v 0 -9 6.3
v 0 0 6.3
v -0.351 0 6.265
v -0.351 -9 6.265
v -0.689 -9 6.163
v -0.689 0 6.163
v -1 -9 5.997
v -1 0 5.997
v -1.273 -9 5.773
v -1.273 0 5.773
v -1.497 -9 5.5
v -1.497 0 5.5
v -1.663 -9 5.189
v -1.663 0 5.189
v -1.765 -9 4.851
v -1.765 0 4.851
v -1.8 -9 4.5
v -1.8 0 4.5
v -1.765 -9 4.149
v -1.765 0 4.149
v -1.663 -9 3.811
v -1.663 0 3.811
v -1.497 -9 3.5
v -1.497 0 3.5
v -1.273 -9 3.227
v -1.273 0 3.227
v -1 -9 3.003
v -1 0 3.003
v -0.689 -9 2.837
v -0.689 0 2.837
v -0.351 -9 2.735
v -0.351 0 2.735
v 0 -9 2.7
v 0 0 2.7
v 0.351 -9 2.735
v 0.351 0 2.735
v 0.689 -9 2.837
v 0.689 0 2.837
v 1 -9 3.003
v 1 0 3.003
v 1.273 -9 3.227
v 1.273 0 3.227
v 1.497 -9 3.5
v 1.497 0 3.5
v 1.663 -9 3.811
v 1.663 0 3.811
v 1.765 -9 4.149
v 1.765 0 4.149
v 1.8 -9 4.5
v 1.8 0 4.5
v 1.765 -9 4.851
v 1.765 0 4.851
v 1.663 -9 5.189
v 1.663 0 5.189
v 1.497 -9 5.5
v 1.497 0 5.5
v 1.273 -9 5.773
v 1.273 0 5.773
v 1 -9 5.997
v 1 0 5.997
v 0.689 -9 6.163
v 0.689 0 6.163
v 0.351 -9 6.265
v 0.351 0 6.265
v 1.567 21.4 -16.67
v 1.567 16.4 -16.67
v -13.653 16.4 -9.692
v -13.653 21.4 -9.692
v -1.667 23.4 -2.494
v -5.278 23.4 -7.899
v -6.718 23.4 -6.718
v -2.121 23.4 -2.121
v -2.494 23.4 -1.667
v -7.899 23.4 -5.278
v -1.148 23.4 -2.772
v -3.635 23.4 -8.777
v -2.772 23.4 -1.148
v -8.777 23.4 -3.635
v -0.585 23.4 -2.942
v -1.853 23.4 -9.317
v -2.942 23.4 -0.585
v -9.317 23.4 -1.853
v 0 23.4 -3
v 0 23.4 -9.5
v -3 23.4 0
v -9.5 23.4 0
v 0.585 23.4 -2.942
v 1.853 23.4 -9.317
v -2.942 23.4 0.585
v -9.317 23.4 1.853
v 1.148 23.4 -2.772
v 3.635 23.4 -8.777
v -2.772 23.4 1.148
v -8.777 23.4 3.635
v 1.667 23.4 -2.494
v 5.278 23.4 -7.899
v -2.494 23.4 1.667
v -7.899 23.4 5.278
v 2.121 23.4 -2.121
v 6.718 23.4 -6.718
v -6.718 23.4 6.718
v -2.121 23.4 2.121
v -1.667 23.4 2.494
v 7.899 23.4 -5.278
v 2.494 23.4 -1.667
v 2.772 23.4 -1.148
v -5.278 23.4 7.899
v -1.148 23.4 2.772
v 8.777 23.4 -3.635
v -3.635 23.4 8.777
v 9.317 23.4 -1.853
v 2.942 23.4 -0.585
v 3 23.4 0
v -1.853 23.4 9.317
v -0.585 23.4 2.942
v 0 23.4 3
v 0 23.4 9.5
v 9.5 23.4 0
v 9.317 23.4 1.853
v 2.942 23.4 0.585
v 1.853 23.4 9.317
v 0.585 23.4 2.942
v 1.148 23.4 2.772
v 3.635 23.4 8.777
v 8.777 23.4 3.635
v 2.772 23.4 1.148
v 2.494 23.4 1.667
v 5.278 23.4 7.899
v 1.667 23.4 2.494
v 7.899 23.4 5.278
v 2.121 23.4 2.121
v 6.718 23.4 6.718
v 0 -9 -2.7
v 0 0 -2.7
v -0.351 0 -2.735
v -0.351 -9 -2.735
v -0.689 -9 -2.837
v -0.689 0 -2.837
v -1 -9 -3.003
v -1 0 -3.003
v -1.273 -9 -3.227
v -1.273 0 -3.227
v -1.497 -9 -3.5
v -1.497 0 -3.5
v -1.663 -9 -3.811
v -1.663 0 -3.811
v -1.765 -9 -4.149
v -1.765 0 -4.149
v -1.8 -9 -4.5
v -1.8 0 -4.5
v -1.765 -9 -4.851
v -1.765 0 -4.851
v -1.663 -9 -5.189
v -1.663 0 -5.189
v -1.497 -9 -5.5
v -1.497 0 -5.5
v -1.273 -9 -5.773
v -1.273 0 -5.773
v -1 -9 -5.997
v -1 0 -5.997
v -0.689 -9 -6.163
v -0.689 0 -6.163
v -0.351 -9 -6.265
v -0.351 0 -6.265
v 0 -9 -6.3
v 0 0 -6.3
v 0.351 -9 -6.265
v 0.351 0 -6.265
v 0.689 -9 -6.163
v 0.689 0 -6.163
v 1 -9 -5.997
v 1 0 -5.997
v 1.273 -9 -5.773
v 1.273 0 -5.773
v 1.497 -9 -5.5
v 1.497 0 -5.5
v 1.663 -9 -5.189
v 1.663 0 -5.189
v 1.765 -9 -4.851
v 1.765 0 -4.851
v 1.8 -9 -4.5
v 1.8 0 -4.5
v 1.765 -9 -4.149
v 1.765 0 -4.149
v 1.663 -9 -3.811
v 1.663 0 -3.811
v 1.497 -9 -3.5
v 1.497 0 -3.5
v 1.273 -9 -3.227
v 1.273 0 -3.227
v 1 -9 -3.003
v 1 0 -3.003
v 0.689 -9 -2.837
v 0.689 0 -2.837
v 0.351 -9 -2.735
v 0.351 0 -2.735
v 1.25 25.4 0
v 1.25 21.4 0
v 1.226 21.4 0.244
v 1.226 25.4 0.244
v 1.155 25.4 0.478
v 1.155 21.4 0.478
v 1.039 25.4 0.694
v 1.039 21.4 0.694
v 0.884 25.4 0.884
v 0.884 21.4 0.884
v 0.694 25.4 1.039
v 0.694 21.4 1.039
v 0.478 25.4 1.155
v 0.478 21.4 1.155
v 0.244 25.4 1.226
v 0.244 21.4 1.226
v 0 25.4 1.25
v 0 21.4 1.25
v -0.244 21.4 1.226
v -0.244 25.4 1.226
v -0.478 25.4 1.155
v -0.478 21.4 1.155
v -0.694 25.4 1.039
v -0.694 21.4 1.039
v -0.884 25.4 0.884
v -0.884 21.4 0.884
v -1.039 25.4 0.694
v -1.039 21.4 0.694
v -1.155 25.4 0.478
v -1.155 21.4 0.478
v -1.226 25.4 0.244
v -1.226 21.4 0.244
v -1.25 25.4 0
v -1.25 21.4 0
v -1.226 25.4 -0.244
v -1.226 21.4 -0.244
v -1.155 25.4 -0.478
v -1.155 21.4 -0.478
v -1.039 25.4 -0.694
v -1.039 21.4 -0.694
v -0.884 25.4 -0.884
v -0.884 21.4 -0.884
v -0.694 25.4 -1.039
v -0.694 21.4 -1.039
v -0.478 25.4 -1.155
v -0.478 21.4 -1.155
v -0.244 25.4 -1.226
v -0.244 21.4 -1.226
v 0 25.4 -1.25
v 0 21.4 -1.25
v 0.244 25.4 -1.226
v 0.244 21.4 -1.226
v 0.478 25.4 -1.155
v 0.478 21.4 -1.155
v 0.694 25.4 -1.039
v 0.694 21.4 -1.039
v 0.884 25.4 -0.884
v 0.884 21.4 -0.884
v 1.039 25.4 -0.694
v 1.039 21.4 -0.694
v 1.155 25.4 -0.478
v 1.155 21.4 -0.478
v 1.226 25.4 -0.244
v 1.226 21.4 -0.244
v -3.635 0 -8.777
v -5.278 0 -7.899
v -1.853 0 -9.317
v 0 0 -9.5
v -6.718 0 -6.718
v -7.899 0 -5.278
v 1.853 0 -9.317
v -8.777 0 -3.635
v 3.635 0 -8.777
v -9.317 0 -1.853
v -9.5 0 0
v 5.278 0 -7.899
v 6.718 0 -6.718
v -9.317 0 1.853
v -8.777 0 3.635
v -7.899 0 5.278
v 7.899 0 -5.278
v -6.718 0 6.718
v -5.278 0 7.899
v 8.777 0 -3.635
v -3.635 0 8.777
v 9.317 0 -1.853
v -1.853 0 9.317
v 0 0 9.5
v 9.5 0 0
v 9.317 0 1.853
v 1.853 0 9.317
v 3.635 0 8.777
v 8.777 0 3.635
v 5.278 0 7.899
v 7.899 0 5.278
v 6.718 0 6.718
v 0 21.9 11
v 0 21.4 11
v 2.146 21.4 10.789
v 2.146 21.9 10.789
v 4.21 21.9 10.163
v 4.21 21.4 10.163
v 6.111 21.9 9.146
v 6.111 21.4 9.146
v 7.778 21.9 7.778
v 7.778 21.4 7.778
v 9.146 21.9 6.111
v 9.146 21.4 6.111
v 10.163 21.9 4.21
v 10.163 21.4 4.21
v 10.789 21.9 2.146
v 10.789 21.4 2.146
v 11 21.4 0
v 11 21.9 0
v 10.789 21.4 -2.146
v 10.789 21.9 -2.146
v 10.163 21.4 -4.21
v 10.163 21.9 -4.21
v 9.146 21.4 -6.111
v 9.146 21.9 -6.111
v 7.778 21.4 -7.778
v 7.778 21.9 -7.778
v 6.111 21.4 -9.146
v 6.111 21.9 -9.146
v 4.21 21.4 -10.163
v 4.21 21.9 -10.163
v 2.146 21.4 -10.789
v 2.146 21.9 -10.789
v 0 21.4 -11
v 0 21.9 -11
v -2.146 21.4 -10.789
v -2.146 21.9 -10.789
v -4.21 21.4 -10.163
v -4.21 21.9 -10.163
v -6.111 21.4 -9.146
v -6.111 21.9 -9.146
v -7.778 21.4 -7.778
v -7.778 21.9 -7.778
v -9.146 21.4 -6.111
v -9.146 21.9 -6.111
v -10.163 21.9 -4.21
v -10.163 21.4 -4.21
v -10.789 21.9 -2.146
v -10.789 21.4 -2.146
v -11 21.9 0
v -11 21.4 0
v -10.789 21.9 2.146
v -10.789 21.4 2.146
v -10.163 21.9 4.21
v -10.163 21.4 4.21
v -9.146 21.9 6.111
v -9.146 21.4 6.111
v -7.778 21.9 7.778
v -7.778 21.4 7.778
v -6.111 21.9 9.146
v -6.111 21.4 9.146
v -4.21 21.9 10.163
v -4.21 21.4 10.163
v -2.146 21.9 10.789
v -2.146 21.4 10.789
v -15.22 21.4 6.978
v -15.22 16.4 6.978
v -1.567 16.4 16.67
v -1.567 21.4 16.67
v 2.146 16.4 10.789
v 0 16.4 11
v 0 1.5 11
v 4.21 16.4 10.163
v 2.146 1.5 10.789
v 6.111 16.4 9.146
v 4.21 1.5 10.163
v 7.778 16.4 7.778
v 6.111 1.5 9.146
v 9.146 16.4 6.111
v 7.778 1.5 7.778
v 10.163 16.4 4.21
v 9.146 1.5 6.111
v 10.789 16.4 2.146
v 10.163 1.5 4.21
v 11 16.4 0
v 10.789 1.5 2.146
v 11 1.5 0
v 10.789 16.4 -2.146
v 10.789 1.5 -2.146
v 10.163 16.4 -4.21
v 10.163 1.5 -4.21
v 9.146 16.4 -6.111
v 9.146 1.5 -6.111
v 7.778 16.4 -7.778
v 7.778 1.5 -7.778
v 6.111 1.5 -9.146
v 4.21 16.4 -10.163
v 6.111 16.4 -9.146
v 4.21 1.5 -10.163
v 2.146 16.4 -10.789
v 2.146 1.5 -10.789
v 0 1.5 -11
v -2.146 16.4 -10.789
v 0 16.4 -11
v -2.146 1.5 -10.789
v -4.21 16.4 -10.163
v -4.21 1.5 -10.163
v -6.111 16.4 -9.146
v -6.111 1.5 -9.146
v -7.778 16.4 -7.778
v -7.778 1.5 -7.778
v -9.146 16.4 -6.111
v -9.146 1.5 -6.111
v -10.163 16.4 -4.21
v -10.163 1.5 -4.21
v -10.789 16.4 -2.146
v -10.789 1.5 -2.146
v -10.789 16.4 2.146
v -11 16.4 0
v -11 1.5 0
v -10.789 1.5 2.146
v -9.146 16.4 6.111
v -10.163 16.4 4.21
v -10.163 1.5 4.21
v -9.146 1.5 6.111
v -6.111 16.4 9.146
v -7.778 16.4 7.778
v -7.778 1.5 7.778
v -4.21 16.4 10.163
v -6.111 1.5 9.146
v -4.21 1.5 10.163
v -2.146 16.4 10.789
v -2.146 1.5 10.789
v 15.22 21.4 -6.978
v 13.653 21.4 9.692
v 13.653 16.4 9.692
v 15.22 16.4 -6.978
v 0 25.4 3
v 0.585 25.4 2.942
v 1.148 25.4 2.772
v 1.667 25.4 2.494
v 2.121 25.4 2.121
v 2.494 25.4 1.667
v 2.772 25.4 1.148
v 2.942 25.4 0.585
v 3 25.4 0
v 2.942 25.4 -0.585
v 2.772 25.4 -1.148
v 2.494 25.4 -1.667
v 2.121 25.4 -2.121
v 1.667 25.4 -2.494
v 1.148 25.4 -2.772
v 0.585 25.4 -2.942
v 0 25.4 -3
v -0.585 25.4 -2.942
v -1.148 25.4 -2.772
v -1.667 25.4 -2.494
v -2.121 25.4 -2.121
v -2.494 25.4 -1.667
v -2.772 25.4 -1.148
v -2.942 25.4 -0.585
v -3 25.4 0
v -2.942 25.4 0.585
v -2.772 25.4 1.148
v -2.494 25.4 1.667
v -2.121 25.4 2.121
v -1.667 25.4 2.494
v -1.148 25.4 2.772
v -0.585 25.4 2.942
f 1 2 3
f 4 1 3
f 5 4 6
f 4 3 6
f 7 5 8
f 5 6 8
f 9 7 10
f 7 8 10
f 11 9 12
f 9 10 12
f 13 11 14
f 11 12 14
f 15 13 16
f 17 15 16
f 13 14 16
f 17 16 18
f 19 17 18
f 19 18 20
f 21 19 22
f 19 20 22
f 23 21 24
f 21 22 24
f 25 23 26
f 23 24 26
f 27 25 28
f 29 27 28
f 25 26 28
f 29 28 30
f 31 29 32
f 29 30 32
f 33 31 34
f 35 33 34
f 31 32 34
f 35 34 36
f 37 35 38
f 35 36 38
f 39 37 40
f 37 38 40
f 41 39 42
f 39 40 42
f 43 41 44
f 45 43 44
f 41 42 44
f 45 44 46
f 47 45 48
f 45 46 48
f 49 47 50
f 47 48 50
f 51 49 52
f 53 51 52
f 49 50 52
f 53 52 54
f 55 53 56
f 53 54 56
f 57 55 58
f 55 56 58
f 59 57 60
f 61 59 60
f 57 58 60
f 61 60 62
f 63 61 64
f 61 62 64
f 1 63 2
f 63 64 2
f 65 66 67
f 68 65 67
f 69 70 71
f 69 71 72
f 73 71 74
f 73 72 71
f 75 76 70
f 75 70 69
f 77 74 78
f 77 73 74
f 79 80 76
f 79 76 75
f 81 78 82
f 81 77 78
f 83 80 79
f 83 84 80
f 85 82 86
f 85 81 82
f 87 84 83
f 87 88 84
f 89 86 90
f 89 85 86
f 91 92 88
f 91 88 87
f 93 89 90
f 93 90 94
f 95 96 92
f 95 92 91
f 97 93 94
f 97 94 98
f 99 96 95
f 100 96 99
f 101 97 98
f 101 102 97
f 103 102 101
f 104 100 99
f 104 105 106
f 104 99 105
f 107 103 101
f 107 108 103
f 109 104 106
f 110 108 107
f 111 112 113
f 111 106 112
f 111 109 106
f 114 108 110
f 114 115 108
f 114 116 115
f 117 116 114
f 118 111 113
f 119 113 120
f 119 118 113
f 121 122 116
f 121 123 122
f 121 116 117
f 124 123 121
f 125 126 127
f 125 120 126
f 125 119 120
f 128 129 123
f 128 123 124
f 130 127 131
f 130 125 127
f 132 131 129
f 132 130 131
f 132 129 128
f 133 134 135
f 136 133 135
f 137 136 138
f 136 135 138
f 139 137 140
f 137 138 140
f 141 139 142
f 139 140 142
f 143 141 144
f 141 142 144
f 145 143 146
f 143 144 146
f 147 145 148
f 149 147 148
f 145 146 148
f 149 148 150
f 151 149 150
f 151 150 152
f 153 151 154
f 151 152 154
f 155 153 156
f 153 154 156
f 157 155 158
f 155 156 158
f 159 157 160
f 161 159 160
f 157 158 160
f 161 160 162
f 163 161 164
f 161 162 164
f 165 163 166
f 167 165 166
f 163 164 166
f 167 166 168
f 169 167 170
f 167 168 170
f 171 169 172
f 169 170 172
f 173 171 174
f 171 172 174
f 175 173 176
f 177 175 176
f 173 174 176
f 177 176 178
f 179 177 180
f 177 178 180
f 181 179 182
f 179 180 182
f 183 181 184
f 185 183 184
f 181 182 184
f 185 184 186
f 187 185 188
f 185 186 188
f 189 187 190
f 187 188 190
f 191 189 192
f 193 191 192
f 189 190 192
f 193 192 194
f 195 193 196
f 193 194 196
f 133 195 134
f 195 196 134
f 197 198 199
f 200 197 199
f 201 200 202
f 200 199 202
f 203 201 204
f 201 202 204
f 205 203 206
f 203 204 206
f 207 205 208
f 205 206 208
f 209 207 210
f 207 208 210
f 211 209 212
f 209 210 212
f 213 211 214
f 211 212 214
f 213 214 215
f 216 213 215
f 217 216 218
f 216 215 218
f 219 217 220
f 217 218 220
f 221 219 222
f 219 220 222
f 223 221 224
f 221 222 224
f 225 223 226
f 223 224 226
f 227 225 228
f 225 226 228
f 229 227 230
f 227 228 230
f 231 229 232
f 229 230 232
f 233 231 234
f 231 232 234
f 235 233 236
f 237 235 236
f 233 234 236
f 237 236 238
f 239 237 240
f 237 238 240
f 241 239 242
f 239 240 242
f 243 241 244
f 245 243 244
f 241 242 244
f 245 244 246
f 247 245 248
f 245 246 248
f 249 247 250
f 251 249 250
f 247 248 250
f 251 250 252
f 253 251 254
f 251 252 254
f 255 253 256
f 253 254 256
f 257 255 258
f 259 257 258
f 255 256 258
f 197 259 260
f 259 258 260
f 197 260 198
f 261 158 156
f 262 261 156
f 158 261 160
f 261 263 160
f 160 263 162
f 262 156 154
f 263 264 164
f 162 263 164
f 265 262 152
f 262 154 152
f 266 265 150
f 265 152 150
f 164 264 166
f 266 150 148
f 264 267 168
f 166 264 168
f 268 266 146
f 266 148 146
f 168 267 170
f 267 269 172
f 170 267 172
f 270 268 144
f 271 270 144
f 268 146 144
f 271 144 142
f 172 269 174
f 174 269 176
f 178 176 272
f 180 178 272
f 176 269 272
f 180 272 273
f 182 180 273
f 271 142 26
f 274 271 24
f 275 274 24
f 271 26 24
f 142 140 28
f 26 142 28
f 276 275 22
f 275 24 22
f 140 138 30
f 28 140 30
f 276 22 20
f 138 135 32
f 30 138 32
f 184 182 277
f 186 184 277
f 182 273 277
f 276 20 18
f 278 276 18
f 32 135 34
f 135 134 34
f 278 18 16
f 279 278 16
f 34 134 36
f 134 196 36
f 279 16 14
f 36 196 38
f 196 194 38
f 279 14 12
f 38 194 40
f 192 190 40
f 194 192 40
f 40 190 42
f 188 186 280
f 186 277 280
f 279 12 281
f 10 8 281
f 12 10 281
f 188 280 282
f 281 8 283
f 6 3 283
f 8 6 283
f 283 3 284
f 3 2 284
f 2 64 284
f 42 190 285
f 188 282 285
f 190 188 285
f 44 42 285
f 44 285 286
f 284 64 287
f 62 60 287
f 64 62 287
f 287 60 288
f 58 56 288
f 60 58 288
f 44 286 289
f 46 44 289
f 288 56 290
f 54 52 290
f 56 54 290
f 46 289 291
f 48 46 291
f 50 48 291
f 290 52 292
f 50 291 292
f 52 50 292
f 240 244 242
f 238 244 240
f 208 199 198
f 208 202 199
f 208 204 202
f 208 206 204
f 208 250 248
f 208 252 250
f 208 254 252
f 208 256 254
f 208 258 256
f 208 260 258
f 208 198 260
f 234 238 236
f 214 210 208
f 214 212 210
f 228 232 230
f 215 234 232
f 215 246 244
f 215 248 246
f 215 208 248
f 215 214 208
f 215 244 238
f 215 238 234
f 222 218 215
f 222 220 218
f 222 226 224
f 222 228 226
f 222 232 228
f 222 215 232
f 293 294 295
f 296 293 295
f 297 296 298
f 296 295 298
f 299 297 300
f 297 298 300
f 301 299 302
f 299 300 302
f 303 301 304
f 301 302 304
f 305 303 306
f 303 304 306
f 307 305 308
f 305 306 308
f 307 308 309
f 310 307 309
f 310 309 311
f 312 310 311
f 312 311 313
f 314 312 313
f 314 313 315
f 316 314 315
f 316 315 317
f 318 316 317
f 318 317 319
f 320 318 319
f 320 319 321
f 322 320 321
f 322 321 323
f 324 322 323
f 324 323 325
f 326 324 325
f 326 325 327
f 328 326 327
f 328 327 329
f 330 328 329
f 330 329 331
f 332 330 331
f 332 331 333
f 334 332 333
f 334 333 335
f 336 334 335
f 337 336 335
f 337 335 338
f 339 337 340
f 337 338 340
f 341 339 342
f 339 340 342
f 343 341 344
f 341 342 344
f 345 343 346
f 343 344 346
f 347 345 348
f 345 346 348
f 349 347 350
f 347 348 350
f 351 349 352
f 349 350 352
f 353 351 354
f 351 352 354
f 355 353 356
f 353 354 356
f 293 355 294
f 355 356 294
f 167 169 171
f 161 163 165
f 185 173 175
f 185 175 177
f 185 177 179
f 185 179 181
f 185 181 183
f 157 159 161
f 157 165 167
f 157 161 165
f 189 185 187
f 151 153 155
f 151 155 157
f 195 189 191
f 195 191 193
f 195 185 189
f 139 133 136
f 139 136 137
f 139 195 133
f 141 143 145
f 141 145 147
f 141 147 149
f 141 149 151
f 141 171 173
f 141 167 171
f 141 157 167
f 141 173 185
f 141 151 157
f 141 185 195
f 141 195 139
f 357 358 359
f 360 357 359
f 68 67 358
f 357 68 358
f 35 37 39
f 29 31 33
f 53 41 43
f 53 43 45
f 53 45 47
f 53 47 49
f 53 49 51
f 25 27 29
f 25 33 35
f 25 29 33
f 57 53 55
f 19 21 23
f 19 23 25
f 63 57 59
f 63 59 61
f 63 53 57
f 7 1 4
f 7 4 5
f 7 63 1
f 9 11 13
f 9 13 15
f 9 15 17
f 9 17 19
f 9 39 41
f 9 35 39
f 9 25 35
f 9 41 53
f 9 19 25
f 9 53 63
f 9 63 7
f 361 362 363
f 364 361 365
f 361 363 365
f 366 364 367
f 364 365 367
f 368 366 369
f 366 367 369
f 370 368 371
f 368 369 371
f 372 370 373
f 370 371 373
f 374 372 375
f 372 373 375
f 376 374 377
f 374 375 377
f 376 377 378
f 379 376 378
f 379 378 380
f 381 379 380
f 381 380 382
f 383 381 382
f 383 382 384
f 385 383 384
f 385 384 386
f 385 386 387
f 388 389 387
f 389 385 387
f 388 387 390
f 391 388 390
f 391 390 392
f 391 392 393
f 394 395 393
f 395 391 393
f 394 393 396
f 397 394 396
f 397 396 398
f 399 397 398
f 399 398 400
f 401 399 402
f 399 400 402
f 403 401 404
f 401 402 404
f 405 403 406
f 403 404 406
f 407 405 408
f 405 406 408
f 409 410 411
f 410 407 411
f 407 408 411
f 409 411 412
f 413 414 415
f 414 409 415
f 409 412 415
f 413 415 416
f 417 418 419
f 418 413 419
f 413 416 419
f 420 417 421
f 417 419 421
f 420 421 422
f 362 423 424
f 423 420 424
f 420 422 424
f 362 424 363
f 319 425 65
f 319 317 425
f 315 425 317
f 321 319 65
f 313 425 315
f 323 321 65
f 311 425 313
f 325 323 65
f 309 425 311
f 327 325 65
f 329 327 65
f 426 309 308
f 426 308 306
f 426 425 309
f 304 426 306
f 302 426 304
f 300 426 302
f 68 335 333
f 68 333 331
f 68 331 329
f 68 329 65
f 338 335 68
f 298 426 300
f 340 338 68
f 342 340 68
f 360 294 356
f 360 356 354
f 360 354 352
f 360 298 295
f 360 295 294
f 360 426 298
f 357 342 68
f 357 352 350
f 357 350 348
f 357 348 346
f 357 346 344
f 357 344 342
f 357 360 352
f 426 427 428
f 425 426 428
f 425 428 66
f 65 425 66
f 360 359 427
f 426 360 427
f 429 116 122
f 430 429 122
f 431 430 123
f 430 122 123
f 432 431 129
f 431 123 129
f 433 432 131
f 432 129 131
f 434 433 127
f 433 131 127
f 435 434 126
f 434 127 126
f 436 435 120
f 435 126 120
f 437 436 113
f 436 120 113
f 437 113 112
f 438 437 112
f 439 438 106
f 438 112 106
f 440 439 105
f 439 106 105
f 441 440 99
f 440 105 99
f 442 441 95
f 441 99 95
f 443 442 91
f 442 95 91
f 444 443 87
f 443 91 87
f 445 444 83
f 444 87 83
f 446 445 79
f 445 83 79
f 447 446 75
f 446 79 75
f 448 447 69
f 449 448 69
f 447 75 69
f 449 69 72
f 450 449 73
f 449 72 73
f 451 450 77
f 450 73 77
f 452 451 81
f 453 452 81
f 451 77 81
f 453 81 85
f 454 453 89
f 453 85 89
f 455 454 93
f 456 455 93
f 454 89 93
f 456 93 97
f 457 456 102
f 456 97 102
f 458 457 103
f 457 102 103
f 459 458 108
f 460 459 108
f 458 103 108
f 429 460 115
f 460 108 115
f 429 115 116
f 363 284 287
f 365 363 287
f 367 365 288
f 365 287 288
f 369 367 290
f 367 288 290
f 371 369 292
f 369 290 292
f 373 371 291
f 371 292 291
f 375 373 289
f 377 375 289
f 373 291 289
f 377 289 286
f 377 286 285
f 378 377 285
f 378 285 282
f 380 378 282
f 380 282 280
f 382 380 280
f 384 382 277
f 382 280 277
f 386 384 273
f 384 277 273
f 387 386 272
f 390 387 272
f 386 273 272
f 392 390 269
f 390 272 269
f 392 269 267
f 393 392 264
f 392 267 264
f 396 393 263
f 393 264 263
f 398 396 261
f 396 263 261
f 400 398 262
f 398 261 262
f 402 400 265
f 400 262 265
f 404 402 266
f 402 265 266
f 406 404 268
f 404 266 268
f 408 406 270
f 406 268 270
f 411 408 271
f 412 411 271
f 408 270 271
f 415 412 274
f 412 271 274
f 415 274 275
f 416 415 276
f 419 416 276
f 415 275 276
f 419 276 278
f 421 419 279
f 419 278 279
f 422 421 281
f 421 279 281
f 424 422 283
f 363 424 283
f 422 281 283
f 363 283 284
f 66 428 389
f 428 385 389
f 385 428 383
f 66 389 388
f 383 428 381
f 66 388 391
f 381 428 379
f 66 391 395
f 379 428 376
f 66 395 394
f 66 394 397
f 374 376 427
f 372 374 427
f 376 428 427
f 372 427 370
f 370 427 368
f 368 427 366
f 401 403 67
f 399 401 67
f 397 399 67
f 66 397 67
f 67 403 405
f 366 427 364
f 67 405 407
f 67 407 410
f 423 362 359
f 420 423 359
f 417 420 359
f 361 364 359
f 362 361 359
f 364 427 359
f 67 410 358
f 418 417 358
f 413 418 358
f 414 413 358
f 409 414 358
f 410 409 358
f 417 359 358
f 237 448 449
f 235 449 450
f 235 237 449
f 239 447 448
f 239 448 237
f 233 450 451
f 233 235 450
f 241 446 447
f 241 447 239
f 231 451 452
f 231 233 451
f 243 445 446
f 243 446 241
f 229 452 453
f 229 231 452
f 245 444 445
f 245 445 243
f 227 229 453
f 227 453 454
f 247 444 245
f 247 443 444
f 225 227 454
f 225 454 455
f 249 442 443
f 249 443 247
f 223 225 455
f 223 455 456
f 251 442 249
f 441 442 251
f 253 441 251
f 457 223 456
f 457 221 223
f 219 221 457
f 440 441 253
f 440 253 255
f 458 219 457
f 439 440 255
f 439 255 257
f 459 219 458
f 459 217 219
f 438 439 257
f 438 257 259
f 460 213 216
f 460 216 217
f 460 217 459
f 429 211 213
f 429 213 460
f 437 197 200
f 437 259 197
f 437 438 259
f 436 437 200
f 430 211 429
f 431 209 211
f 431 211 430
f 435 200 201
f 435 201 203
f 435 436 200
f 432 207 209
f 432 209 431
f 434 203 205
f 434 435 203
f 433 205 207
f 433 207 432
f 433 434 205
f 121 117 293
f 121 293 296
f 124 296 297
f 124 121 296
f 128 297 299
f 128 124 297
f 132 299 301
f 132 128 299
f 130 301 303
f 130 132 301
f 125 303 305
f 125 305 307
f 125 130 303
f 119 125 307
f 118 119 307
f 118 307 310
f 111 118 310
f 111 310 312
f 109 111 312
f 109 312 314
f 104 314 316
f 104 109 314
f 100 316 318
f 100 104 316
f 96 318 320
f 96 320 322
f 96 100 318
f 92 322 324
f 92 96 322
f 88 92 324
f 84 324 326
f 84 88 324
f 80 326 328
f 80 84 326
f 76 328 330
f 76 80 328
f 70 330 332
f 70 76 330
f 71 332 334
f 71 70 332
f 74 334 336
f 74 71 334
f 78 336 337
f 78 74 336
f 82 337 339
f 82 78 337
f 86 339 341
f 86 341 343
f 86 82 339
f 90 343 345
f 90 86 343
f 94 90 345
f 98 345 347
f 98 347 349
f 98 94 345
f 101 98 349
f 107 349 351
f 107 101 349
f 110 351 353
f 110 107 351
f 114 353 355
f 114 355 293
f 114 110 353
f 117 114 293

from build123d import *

# Parameters (mm, degrees)
SKETCH_1_R             = 11
EXTRUDE_1_DEPTH        = 23.4
SKETCH_2_R             = 3
EXTRUDE_2_DEPTH        = 2
HOLE_WIZARD_M3_1_D     = 2.5
HOLE_WIZARD_M3_1_DEPTH = 7.5
HOLE_WIZARD_M3_1_TIP   = 0.751075774
CHAMFER_1_SIZE         = 1.5
CHAMFER_2_SIZE         = 1.5
SKETCH_5_R             = 1.8
EXTRUDE_3_DEPTH        = 9
EXTRUDE_4_DEPTH        = 5


with BuildPart() as part:
    # 草图1 → 凸台-拉伸1 (new body)
    with BuildSketch(Plane(origin=(0, 0, 0), x_dir=(1, 0, 0), z_dir=(0, 1, 0))):
        with Locations(Location((0, 0, 0), (0, 0, 270))):
            Circle(SKETCH_1_R)
    extrude(amount=EXTRUDE_1_DEPTH)

    # 草图2 → 凸台-拉伸2 (add)
    with BuildSketch(Plane(origin=(0, 23.4, 0), x_dir=(1, 0, 0), z_dir=(0, 1, 0))):
        with Locations(Location((0, 0, 0), (0, 0, 270))):
            Circle(SKETCH_2_R)
    extrude(amount=EXTRUDE_2_DEPTH)

    # M3 螺纹孔1
    with Locations(Plane(origin=(0, 25.4, 0), x_dir=(-1, 0, 0), z_dir=(0, 1, 0))):
        with Locations((0, 0)):
            Hole(HOLE_WIZARD_M3_1_D / 2, depth=HOLE_WIZARD_M3_1_DEPTH)
            with Locations((0, 0, -(HOLE_WIZARD_M3_1_DEPTH + HOLE_WIZARD_M3_1_TIP / 2))):  # 118° drill point
                Cone(0, HOLE_WIZARD_M3_1_D / 2, HOLE_WIZARD_M3_1_TIP, mode=Mode.SUBTRACT)

    # 倒角1
    chamfer_1_edges = [part.edges().sort_by_distance(p)[0] for p in [
        (0, 23.4, -11),
    ]]
    chamfer(chamfer_1_edges, length=CHAMFER_1_SIZE)

    # 倒角2
    chamfer_2_edges = [part.edges().sort_by_distance(p)[0] for p in [
        (0, 0, -11),
    ]]
    chamfer(chamfer_2_edges, length=CHAMFER_2_SIZE)

    # 草图5 → 凸台-拉伸3 (add)
    with BuildSketch(Plane.XZ):
        with Locations(Location((0, 4.5, 0), (0, 0, 90))):
            Circle(SKETCH_5_R)
        with Locations(Location((0, -4.5, 0), (0, 0, 90))):
            Circle(SKETCH_5_R)
    extrude(amount=EXTRUDE_3_DEPTH)

    # 草图6 → 凸台-拉伸4 (add)
    with BuildSketch(Plane(origin=(0, 16.4, 0), x_dir=(-1, 0, 0), z_dir=(0, 1, 0))):
        Polygon((13.652715142, -9.69209485), (15.219957927, 6.977550719), (1.567242785, 16.669645569), (-13.652715142, 9.69209485), (-15.219957927, -6.977550719), (-1.567242785, -16.669645569), align=None)
    extrude(amount=EXTRUDE_4_DEPTH)


solid = part.part
